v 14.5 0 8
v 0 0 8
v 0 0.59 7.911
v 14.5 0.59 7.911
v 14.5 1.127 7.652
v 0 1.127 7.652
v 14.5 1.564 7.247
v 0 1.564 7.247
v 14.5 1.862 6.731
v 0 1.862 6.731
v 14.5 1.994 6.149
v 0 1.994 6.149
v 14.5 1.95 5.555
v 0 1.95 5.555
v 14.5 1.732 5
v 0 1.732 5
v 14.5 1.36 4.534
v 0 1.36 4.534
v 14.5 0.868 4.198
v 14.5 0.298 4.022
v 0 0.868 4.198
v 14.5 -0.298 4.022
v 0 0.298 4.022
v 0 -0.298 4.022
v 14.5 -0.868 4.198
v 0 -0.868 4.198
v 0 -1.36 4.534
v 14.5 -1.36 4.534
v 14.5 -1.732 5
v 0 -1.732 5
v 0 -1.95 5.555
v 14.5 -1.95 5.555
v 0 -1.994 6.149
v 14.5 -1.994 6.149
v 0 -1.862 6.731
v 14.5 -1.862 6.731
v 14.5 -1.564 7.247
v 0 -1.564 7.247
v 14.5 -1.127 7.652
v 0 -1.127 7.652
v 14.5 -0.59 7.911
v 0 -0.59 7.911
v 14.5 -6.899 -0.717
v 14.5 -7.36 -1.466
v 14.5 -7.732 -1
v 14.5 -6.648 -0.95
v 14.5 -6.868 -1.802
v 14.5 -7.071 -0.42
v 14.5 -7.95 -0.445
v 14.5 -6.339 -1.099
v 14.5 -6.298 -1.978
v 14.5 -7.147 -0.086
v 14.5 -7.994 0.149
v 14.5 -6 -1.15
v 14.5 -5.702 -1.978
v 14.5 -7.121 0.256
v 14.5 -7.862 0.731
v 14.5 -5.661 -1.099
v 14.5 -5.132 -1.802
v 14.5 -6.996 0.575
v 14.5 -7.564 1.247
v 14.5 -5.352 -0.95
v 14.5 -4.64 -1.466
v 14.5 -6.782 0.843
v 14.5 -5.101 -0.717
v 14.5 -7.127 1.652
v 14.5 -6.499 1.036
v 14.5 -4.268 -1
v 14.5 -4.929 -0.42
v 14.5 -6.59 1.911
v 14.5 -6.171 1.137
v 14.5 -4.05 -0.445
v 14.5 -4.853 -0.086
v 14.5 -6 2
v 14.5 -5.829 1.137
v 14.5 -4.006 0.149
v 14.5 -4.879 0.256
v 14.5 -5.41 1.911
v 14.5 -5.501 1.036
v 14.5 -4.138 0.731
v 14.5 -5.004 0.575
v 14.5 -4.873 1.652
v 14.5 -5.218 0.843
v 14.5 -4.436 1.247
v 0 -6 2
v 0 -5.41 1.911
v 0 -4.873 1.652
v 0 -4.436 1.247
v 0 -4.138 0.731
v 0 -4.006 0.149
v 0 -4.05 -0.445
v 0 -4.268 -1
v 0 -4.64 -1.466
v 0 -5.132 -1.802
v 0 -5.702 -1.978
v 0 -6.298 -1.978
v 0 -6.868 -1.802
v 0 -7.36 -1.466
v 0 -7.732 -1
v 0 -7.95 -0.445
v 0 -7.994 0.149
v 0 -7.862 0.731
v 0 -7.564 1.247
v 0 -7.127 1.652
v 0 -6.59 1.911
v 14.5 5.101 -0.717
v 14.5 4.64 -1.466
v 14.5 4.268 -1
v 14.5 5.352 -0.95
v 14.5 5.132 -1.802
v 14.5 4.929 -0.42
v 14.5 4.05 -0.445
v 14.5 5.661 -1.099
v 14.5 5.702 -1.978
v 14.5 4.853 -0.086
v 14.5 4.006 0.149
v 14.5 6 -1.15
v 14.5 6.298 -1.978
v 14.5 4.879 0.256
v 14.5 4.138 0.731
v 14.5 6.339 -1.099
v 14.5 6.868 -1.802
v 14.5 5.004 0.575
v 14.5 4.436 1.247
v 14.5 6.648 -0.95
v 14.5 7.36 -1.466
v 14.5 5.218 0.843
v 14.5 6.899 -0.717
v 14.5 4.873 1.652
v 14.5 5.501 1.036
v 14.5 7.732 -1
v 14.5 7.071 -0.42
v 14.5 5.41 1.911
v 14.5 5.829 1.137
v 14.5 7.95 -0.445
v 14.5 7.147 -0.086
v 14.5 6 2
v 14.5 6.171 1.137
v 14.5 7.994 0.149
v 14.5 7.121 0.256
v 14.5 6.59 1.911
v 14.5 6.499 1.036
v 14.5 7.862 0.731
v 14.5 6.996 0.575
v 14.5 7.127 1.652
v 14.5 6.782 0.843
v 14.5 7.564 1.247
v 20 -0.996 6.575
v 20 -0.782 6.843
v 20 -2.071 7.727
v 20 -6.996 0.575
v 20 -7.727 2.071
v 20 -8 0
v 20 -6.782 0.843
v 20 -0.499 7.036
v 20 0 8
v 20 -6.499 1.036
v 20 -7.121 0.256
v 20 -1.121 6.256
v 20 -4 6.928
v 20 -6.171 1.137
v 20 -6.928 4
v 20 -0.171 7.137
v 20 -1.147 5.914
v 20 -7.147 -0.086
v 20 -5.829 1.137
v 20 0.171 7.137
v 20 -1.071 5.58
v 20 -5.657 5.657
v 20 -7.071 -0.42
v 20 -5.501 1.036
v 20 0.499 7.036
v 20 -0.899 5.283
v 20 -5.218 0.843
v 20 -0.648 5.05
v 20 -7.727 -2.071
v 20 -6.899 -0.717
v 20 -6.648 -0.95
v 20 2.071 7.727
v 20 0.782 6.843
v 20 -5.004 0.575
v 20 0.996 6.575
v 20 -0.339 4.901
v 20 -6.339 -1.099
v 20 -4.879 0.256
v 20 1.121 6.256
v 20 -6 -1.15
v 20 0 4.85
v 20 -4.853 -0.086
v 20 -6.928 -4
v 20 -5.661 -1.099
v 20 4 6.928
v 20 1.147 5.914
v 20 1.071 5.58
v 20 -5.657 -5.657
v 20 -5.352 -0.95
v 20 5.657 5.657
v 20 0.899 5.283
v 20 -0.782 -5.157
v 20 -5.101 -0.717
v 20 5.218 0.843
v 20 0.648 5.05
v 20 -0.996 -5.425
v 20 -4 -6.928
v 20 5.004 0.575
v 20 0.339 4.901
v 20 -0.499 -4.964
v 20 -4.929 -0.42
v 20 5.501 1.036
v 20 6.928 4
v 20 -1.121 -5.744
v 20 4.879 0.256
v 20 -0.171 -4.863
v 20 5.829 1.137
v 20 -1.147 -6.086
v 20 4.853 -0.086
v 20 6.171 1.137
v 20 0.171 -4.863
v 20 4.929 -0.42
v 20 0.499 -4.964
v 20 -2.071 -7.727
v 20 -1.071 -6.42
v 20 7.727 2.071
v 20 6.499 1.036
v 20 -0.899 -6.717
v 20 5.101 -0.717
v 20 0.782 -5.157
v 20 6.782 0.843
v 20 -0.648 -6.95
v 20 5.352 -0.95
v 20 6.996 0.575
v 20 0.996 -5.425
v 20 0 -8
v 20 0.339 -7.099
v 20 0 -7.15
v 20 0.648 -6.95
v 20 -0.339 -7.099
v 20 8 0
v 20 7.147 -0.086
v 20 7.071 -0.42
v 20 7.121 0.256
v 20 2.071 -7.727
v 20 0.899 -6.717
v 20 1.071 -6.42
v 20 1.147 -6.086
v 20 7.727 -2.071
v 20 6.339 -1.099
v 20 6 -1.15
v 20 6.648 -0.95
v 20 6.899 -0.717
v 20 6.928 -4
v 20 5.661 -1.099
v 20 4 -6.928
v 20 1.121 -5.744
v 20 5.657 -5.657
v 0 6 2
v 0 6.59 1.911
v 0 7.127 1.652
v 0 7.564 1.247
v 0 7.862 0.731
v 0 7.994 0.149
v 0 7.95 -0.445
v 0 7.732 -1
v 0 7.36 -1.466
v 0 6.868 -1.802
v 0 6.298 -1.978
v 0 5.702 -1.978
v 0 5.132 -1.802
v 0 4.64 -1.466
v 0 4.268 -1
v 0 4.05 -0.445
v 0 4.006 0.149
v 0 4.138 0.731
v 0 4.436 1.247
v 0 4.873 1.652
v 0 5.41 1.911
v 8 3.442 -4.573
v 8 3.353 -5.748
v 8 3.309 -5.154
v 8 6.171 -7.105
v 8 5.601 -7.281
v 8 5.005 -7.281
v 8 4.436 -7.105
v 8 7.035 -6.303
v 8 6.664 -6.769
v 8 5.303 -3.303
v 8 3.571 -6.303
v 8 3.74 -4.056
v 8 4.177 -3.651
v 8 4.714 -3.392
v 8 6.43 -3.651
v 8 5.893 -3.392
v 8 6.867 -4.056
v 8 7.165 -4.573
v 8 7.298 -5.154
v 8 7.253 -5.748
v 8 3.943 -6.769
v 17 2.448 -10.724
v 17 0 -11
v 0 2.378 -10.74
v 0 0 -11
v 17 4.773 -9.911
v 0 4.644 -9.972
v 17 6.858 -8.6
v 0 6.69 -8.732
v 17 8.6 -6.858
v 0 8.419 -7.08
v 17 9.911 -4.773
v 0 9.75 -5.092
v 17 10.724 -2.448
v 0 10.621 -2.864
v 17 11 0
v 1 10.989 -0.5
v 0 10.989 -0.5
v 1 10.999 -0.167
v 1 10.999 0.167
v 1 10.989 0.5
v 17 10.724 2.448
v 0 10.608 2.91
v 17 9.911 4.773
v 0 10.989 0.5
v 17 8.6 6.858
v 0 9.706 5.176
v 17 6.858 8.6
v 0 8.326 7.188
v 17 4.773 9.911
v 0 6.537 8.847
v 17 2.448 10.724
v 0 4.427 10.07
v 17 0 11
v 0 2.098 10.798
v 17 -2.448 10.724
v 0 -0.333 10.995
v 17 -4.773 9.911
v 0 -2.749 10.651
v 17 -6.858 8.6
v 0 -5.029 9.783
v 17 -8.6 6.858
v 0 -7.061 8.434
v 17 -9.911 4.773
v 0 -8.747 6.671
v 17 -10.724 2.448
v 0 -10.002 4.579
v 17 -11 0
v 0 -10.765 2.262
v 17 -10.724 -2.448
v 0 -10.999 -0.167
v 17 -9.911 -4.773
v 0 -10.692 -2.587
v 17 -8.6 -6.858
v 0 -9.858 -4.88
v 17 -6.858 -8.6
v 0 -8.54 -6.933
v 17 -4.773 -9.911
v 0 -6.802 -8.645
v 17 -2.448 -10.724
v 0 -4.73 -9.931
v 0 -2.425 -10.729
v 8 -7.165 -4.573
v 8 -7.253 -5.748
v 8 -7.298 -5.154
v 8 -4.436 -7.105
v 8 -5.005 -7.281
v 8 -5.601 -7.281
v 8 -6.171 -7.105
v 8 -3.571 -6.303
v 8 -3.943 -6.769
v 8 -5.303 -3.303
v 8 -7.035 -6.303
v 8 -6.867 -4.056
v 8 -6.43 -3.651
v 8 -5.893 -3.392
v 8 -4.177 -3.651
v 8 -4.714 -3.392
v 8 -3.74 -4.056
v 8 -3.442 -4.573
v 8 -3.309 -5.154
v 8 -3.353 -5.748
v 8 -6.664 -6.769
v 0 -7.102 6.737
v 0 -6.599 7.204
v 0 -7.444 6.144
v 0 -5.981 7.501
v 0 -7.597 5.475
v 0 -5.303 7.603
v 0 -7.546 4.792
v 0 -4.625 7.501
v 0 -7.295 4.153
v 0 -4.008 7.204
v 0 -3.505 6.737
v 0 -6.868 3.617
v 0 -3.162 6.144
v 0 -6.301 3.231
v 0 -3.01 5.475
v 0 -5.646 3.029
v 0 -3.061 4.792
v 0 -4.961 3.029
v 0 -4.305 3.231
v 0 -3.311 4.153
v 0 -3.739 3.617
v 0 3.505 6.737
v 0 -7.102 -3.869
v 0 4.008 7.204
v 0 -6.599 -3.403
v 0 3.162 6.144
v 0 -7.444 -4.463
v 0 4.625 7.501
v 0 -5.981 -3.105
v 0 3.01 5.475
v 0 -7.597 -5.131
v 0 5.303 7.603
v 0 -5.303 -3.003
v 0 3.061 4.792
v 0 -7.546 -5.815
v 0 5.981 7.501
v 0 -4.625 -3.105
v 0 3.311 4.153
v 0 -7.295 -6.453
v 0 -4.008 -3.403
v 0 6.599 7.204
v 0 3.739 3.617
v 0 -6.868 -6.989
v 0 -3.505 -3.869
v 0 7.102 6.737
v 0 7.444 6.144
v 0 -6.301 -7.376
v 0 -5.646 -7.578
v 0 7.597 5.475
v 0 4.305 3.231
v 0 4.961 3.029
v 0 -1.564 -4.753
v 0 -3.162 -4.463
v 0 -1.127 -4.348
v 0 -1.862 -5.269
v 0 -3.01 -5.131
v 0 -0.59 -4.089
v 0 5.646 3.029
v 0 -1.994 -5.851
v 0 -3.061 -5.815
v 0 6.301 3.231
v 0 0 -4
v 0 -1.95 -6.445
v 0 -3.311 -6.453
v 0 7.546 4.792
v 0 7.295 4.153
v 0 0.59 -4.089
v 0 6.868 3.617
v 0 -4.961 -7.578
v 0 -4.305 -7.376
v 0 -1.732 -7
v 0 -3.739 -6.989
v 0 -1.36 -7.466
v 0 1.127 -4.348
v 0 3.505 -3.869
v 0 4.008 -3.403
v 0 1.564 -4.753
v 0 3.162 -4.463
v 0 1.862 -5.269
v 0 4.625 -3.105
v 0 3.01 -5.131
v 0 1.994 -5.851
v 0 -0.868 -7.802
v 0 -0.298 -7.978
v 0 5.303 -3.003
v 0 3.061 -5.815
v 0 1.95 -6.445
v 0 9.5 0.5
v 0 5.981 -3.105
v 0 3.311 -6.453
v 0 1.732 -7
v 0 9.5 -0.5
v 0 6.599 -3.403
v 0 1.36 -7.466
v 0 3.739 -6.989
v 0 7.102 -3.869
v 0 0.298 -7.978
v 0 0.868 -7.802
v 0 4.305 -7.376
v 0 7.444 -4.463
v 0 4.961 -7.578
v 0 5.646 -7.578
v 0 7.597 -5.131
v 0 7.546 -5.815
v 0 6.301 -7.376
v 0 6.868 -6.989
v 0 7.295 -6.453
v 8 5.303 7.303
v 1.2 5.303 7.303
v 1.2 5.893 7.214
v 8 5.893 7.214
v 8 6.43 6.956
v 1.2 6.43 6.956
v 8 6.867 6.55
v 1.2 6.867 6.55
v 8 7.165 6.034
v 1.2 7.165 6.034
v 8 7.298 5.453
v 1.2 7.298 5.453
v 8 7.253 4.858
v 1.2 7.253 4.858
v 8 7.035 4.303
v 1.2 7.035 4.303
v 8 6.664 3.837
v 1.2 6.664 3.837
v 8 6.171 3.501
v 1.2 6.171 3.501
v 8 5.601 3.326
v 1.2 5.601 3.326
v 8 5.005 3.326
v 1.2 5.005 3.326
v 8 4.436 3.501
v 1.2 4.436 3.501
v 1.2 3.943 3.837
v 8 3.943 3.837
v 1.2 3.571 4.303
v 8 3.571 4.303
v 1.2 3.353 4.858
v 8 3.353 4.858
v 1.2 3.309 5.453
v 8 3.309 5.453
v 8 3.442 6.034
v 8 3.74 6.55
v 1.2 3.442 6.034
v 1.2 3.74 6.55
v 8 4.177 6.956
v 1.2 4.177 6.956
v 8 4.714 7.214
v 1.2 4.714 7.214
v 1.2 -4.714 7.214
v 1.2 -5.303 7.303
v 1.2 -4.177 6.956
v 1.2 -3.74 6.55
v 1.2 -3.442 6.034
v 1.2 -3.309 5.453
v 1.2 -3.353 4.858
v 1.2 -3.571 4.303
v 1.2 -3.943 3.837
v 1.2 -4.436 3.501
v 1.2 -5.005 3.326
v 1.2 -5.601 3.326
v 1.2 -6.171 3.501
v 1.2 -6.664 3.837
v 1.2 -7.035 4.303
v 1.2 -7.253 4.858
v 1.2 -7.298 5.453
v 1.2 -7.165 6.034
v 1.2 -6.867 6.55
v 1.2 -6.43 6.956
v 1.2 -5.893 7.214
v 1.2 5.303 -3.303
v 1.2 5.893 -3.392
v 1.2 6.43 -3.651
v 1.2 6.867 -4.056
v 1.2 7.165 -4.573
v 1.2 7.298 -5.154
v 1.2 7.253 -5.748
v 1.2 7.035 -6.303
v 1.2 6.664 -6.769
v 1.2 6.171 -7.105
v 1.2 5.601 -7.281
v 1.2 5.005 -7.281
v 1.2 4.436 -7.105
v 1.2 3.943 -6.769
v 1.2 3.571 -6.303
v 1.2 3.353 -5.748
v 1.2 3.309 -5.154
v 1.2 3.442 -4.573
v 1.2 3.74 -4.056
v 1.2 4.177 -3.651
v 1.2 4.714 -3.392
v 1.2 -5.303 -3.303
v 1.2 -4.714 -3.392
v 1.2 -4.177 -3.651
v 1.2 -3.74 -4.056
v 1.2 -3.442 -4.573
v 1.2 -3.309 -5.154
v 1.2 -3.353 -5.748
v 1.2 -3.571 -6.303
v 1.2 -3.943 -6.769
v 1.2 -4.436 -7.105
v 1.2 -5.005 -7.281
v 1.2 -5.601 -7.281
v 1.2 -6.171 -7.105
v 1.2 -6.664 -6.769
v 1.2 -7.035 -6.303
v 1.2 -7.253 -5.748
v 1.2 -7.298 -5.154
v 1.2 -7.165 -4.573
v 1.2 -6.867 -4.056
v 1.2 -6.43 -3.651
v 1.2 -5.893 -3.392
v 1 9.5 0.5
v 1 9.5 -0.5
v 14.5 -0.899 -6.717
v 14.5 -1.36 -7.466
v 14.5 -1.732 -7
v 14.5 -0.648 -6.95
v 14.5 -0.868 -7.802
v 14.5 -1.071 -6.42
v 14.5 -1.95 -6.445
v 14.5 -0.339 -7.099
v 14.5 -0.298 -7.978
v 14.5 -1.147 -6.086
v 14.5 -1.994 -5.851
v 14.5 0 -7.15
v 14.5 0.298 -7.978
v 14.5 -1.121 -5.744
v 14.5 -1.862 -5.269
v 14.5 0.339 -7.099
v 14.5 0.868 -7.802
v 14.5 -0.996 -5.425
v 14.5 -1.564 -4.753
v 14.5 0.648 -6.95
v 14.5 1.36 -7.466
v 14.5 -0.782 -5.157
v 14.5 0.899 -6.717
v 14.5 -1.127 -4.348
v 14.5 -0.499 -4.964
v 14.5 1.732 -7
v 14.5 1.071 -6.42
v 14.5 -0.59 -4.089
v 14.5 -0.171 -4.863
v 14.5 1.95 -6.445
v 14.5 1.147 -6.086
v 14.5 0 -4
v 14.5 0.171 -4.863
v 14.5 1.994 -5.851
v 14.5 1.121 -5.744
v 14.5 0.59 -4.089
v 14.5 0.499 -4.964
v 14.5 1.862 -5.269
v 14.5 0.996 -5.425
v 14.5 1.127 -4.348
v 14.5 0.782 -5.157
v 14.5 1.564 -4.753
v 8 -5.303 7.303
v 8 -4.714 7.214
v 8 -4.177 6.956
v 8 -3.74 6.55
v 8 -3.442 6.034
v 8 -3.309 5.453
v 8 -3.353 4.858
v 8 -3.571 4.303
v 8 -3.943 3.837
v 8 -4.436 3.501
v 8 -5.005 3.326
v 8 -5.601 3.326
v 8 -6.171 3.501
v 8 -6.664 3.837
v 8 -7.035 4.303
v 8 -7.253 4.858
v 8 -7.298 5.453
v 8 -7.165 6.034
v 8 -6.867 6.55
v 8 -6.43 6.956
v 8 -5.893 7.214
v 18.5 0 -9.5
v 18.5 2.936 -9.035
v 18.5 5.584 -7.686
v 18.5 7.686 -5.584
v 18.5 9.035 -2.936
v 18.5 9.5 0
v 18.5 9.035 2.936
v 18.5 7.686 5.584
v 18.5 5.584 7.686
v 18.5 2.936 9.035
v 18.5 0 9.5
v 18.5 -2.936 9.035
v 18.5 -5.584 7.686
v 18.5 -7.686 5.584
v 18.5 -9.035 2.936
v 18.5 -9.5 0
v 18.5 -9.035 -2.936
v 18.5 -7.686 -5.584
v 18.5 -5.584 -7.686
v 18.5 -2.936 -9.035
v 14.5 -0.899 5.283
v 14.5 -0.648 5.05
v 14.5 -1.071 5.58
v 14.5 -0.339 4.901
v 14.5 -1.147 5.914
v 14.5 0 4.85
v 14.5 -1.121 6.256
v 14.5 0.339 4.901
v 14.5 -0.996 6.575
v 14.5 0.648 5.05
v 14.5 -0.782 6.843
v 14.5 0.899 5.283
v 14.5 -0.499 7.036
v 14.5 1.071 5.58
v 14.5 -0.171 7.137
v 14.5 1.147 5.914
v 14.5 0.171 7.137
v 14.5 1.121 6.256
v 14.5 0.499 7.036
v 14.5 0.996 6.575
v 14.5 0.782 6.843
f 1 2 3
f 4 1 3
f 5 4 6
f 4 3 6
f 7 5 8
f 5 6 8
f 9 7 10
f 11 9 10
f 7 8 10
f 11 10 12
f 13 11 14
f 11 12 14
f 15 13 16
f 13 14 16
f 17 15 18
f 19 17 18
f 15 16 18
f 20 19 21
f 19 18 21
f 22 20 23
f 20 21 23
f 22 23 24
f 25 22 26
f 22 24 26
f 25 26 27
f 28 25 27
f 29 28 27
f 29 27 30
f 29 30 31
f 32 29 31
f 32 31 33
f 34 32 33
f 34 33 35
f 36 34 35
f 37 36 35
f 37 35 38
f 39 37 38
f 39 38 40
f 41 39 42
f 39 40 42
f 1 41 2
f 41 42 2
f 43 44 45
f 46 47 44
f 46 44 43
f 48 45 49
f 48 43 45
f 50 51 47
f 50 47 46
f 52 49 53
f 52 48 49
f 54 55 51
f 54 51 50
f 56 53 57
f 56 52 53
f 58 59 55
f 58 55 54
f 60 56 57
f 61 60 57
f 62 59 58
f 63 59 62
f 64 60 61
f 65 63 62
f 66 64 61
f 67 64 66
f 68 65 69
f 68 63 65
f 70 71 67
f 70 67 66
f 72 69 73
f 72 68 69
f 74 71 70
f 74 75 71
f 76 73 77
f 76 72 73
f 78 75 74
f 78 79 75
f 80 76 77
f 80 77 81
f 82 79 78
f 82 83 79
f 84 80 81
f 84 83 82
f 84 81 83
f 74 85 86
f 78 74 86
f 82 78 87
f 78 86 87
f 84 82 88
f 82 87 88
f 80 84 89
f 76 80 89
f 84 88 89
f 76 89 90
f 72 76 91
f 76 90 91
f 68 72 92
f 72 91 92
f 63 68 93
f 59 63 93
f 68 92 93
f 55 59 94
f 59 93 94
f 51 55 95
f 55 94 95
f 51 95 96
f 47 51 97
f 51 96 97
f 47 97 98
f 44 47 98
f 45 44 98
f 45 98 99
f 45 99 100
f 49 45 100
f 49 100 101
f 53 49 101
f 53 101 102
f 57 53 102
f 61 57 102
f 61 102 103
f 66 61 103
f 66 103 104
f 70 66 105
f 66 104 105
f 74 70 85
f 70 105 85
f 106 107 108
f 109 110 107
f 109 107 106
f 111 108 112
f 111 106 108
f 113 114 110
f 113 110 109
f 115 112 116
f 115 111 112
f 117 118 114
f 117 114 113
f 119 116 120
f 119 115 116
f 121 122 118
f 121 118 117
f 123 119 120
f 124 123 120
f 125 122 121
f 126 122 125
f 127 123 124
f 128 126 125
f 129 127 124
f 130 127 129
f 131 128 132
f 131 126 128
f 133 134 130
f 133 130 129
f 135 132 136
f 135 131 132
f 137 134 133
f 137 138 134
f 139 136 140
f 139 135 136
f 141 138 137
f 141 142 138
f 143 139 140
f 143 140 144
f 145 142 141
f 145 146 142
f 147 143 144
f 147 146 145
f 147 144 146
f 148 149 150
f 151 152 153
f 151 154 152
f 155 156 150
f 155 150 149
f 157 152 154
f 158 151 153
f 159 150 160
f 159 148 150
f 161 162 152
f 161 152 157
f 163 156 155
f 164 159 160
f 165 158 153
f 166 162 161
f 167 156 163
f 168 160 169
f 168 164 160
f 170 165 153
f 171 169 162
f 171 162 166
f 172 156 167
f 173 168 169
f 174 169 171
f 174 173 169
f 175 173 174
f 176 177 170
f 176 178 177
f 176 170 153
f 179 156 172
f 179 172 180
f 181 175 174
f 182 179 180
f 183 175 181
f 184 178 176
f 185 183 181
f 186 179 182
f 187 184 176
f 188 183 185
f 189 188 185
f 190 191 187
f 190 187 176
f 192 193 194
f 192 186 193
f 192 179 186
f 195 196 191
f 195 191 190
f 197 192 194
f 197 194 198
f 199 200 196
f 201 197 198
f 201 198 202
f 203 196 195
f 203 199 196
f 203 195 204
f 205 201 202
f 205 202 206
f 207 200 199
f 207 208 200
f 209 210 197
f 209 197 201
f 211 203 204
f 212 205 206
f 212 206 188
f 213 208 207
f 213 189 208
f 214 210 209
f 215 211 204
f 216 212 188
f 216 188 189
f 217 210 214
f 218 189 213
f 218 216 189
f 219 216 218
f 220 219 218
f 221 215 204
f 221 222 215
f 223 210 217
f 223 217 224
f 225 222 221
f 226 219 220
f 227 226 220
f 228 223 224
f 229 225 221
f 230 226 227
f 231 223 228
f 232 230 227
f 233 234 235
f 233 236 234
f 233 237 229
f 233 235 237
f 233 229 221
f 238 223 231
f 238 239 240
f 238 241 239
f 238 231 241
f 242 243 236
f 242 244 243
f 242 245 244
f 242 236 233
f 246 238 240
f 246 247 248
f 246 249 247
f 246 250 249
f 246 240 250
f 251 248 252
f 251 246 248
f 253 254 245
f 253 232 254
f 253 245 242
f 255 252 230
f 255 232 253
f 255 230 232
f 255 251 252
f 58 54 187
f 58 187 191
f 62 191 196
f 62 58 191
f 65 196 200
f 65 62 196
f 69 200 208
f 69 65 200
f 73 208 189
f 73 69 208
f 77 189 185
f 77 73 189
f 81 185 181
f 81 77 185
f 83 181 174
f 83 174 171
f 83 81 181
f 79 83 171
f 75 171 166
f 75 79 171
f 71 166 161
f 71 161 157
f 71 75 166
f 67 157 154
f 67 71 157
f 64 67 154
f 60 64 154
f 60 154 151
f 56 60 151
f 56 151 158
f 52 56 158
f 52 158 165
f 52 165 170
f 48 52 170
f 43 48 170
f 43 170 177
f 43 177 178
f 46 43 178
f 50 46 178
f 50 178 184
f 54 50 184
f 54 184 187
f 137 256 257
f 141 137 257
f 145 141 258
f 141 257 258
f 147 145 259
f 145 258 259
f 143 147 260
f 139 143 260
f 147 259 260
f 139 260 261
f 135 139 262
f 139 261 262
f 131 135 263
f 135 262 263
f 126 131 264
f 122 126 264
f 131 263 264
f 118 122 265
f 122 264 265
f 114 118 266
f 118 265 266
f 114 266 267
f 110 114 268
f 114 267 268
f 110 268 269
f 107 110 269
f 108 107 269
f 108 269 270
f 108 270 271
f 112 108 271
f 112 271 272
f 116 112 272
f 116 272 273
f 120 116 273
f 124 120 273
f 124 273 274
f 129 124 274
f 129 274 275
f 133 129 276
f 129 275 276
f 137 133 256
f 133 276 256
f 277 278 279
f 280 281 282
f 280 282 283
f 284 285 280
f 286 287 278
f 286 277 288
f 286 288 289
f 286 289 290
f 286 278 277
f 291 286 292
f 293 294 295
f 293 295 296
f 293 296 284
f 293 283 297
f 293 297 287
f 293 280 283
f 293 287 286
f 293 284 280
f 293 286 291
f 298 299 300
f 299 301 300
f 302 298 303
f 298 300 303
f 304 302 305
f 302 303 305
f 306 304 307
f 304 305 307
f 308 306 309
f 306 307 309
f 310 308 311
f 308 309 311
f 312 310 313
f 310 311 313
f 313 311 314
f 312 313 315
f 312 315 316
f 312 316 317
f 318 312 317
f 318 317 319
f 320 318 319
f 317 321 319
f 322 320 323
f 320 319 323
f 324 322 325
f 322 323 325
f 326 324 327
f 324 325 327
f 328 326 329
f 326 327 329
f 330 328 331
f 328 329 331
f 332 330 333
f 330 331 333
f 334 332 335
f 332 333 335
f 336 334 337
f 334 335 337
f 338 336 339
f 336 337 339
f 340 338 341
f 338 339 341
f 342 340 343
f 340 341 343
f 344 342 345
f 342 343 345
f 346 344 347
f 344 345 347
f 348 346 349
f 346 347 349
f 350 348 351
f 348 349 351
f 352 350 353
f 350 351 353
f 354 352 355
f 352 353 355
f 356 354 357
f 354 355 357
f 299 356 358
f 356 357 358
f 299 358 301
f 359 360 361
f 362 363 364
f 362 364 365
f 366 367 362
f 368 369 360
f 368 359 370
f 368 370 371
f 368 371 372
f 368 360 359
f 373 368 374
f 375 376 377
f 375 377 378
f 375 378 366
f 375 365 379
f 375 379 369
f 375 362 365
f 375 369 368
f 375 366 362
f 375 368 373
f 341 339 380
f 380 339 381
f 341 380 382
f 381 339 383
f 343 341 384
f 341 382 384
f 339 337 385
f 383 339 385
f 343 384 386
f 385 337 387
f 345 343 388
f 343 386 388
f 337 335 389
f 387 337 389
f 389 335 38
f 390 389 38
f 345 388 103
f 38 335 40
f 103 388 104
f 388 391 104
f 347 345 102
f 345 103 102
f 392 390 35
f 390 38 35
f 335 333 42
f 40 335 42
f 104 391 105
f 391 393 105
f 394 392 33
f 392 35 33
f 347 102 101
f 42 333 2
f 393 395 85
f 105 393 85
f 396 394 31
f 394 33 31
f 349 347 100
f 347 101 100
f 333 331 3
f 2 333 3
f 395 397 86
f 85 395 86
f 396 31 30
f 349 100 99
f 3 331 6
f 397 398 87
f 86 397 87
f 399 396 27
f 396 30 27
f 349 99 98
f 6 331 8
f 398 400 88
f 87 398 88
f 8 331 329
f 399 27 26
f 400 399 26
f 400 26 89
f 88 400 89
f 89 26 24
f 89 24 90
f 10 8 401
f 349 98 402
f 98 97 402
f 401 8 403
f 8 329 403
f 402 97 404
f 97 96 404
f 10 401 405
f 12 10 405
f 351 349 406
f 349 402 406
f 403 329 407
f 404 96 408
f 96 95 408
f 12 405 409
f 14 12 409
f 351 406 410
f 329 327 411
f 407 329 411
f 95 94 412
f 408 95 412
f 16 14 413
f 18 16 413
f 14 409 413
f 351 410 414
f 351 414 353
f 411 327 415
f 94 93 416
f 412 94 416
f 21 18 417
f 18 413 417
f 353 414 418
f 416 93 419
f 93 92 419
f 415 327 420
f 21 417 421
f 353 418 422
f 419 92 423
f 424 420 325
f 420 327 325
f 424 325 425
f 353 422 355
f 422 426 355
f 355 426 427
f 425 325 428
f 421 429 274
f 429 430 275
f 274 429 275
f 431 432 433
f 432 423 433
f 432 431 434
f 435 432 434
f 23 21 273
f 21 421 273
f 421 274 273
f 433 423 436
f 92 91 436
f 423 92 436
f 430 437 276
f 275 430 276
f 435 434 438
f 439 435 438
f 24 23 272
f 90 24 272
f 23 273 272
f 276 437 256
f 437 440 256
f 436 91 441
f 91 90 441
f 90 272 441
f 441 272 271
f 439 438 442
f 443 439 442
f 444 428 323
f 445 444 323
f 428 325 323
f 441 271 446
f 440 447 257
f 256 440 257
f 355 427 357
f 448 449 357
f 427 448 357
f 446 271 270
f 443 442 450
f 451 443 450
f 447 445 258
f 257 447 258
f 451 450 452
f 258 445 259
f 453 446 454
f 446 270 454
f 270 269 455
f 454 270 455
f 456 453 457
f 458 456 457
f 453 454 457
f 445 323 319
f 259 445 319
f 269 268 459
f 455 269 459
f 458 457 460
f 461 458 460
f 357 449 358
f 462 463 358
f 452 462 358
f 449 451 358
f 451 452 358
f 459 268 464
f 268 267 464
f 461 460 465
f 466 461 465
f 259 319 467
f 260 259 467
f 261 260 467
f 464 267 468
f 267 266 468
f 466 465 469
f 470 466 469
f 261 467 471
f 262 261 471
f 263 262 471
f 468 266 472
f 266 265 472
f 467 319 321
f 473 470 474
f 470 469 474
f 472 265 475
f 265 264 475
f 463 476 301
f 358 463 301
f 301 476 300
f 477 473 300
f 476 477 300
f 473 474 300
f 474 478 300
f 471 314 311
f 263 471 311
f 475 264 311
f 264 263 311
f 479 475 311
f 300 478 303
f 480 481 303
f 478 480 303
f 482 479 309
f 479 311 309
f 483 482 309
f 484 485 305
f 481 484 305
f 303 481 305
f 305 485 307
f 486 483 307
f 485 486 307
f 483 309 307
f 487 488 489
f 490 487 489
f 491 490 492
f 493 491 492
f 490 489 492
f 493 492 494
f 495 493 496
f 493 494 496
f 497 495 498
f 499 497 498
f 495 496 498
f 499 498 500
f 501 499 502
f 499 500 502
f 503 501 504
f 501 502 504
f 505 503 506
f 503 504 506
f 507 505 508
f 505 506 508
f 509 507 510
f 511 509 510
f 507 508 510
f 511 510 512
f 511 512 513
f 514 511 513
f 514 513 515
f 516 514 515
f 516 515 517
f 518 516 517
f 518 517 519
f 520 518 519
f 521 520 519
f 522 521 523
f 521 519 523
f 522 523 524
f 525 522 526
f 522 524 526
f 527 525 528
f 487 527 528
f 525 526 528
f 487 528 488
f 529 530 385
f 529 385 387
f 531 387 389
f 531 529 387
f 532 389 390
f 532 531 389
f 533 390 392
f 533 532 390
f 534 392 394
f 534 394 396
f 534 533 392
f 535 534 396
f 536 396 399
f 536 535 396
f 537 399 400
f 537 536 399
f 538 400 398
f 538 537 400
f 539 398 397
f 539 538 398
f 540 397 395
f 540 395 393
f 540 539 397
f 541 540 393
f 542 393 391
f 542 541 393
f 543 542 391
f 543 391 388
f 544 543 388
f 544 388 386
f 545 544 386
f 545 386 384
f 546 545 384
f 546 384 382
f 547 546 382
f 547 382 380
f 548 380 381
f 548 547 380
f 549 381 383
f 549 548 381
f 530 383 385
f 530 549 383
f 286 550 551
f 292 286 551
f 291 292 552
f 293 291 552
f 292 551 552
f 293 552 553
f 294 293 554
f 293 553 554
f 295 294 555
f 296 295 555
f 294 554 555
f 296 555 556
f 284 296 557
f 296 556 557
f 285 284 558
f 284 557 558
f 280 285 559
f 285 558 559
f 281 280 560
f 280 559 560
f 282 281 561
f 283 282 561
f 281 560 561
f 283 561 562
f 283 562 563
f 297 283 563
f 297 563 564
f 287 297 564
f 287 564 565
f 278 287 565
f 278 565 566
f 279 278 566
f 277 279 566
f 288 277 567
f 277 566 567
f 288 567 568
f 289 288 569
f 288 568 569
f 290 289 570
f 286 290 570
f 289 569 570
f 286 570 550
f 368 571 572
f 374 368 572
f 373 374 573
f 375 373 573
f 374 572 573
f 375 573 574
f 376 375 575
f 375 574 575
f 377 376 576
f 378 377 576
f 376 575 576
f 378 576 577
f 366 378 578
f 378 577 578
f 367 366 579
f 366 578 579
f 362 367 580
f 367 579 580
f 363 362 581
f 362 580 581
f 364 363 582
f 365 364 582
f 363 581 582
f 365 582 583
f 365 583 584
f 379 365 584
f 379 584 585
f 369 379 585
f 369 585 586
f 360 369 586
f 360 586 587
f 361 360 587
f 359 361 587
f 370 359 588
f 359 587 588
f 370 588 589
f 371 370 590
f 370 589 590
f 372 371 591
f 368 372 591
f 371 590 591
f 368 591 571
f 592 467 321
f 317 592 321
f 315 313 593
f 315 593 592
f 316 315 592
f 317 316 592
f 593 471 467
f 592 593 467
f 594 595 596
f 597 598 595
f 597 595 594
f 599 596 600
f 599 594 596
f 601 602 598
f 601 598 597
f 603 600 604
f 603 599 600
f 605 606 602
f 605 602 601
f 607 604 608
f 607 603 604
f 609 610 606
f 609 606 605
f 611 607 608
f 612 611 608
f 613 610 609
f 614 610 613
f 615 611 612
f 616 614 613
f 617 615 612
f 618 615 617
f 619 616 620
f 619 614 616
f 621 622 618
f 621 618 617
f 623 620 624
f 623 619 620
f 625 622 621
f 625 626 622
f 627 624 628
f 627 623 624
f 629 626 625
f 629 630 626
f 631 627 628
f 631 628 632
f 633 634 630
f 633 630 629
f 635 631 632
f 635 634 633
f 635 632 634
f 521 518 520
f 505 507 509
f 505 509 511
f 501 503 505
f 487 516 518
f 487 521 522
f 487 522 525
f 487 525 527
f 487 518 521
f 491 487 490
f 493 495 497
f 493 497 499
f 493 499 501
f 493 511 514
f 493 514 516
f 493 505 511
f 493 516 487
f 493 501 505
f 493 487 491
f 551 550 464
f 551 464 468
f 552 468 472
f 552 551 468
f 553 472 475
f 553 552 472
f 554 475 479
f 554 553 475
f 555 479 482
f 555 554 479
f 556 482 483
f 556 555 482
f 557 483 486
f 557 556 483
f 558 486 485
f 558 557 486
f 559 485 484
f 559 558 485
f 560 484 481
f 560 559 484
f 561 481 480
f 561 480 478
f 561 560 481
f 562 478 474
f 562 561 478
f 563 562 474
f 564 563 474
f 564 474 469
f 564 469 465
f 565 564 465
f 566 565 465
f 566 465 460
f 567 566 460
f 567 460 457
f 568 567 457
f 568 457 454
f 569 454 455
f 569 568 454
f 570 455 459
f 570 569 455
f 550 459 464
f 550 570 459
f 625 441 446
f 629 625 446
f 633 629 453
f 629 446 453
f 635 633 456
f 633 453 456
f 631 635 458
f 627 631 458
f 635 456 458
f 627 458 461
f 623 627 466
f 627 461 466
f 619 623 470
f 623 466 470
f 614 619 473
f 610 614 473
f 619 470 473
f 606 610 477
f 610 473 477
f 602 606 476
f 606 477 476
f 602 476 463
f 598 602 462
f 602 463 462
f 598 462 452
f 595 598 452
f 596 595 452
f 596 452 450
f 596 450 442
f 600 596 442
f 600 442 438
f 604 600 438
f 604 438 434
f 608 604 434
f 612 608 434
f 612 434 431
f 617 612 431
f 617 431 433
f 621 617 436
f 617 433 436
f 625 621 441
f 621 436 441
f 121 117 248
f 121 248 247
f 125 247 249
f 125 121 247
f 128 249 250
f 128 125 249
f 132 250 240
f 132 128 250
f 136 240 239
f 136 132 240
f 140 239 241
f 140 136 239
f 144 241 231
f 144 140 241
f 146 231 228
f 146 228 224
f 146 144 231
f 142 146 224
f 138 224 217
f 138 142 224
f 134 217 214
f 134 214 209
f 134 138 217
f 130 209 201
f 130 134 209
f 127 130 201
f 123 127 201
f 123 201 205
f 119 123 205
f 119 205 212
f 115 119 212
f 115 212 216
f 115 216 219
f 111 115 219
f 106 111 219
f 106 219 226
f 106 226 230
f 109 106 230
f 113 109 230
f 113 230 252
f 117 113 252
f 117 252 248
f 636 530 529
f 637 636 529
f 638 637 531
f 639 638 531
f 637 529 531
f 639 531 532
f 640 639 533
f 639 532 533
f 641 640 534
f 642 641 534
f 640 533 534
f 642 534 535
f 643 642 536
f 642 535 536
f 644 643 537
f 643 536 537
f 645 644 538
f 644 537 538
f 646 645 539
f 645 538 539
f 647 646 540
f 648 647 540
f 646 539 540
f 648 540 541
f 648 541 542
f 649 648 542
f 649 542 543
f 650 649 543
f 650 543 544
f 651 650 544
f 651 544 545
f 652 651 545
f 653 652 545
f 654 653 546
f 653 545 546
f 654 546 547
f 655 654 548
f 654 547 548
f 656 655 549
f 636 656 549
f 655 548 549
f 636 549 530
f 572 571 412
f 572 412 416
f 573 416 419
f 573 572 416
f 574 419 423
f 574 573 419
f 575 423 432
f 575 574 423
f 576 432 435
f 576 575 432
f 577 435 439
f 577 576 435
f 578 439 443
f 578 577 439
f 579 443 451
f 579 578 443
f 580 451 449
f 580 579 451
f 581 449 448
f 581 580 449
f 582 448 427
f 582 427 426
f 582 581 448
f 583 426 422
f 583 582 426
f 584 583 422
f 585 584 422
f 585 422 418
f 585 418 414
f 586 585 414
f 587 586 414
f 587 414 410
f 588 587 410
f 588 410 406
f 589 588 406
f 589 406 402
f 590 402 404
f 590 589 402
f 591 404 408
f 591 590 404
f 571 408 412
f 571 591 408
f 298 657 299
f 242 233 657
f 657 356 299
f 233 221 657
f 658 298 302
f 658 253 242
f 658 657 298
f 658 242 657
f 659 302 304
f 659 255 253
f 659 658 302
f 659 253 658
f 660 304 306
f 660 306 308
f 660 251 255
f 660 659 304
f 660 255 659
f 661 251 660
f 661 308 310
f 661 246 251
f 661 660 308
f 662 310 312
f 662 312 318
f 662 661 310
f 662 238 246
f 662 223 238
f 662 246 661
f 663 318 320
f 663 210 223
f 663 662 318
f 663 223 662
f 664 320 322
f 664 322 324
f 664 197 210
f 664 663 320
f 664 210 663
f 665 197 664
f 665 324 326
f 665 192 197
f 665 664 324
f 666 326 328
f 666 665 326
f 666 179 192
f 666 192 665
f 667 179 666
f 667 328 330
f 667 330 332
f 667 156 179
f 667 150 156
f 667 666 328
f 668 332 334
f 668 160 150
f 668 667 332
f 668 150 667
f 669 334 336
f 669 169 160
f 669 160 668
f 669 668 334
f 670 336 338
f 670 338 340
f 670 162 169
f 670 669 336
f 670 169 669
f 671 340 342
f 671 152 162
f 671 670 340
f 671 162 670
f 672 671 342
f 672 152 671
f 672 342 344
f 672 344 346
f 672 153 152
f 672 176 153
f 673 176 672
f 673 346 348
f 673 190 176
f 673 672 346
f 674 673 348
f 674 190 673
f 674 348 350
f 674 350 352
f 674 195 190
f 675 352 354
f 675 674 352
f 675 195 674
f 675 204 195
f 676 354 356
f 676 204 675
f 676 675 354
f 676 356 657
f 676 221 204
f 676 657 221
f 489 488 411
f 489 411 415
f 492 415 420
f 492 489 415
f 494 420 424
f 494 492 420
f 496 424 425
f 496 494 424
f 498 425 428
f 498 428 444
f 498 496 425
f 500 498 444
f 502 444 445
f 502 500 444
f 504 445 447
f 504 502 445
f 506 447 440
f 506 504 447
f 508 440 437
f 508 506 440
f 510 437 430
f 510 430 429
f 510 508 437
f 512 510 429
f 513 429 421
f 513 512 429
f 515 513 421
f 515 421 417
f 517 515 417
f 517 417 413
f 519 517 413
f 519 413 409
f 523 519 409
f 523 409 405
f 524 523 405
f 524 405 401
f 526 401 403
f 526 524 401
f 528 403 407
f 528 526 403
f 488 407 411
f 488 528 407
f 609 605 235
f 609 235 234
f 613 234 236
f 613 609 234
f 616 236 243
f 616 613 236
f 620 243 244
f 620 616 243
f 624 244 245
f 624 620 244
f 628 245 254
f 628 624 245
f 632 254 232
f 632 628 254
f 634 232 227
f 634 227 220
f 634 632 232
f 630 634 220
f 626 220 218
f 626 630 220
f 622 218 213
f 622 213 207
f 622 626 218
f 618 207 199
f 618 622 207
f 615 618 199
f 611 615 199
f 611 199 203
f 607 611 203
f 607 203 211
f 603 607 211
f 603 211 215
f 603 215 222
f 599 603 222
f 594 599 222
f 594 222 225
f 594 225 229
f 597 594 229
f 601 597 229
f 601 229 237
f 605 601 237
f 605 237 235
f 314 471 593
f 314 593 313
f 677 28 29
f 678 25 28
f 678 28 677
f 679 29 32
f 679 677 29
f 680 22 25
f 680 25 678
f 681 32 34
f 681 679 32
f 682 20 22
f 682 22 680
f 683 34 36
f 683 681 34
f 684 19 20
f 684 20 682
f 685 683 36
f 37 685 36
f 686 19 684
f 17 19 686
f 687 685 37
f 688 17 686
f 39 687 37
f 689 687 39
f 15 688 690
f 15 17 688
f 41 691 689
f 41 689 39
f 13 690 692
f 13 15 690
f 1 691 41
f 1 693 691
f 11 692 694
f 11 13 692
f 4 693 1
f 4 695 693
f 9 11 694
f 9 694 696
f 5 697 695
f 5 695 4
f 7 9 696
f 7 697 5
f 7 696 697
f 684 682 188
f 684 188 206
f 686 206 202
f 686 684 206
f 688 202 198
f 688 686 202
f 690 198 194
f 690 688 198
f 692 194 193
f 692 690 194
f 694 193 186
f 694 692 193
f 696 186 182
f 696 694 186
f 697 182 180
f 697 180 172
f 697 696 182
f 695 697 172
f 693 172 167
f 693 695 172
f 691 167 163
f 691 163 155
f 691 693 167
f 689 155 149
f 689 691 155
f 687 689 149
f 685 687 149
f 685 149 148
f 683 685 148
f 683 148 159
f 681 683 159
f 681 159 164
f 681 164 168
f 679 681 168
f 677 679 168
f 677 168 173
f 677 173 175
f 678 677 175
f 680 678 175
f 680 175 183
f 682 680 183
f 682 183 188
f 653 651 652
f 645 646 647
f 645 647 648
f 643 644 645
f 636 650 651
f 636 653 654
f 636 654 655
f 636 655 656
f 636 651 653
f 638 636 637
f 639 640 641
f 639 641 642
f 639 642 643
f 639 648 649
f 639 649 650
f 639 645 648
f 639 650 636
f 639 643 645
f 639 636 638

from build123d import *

# Parameters (mm, degrees)
SKETCH2_R           = 11
SKETCH2_R_2         = 1.15
BOSS_EXTRUDE1_DEPTH = 20
CHAMFER1_SIZE       = 3
SKETCH5_R           = 2
CUT_EXTRUDE2_DEPTH  = 14.5
SKETCH6_R           = 2
CUT_EXTRUDE3_DEPTH  = 8
CHAMFER2_SIZE       = 0.3
CHAMFER2_SIZE2      = 1.2
SKETCH7_W           = 1
SKETCH7_H           = 3
CUT_EXTRUDE4_DEPTH  = 1


with BuildPart() as part:
    # Sketch2 → Boss-Extrude1 (new body)
    with BuildSketch(Plane(origin=(0, 0, 0), x_dir=(0, 0, -1), z_dir=(1, 0, 0))):
        Circle(SKETCH2_R)
        with Locations((0, 6)):
            Circle(SKETCH2_R_2, mode=Mode.SUBTRACT)
        with Locations((-6, 0)):
            Circle(SKETCH2_R_2, mode=Mode.SUBTRACT)
        with Locations((0, -6)):
            Circle(SKETCH2_R_2, mode=Mode.SUBTRACT)
        with Locations((6, 0)):
            Circle(SKETCH2_R_2, mode=Mode.SUBTRACT)
    extrude(amount=BOSS_EXTRUDE1_DEPTH)

    # Chamfer1
    chamfer1_edges = [part.edges().sort_by_distance(p)[0] for p in [
        (20, 0, 11),
    ]]
    chamfer(chamfer1_edges, length=CHAMFER1_SIZE)

    # Sketch5 → Cut-Extrude2 (cut)
    with BuildSketch(Plane.ZY):
        with Locations((-6, 0)):
            Circle(SKETCH5_R)
        with Locations((0, 6)):
            Circle(SKETCH5_R)
        with Locations((0, -6)):
            Circle(SKETCH5_R)
        with Locations((6, 0)):
            Circle(SKETCH5_R)
    extrude(amount=-CUT_EXTRUDE2_DEPTH, mode=Mode.SUBTRACT)

    # Sketch6 → Cut-Extrude3 (cut)
    with BuildSketch(Plane.ZY):
        with Locations((5.303300859, 5.303300859)):
            Circle(SKETCH6_R)
        with Locations((-5.303300859, 5.303300859)):
            Circle(SKETCH6_R)
        with Locations((-5.303300859, -5.303300859)):
            Circle(SKETCH6_R)
        with Locations((5.303300859, -5.303300859)):
            Circle(SKETCH6_R)
    extrude(amount=-CUT_EXTRUDE3_DEPTH, mode=Mode.SUBTRACT)

    # Chamfer2
    chamfer2_edges = [part.edges().sort_by_distance(p)[0] for p in [
        (0, -5.303300859, 3.303300859),
        (0, -5.303300859, -7.303300859),
        (0, 5.303300859, -7.303300859),
        (0, 5.303300859, 3.303300859),
    ]]
    chamfer2_side = [part.faces().sort_by_distance(p)[0] for p in [
        (0, 0, 0),
    ]]
    chamfer(chamfer2_edges, length=CHAMFER2_SIZE, length2=CHAMFER2_SIZE2, reference=chamfer2_side[0])

    # Sketch7 → Cut-Extrude4 (cut)
    with BuildSketch(Plane.ZY):
        with Locations((0, 11)):
            Rectangle(SKETCH7_W, SKETCH7_H)
    extrude(amount=-CUT_EXTRUDE4_DEPTH, mode=Mode.SUBTRACT)


solid = part.part
